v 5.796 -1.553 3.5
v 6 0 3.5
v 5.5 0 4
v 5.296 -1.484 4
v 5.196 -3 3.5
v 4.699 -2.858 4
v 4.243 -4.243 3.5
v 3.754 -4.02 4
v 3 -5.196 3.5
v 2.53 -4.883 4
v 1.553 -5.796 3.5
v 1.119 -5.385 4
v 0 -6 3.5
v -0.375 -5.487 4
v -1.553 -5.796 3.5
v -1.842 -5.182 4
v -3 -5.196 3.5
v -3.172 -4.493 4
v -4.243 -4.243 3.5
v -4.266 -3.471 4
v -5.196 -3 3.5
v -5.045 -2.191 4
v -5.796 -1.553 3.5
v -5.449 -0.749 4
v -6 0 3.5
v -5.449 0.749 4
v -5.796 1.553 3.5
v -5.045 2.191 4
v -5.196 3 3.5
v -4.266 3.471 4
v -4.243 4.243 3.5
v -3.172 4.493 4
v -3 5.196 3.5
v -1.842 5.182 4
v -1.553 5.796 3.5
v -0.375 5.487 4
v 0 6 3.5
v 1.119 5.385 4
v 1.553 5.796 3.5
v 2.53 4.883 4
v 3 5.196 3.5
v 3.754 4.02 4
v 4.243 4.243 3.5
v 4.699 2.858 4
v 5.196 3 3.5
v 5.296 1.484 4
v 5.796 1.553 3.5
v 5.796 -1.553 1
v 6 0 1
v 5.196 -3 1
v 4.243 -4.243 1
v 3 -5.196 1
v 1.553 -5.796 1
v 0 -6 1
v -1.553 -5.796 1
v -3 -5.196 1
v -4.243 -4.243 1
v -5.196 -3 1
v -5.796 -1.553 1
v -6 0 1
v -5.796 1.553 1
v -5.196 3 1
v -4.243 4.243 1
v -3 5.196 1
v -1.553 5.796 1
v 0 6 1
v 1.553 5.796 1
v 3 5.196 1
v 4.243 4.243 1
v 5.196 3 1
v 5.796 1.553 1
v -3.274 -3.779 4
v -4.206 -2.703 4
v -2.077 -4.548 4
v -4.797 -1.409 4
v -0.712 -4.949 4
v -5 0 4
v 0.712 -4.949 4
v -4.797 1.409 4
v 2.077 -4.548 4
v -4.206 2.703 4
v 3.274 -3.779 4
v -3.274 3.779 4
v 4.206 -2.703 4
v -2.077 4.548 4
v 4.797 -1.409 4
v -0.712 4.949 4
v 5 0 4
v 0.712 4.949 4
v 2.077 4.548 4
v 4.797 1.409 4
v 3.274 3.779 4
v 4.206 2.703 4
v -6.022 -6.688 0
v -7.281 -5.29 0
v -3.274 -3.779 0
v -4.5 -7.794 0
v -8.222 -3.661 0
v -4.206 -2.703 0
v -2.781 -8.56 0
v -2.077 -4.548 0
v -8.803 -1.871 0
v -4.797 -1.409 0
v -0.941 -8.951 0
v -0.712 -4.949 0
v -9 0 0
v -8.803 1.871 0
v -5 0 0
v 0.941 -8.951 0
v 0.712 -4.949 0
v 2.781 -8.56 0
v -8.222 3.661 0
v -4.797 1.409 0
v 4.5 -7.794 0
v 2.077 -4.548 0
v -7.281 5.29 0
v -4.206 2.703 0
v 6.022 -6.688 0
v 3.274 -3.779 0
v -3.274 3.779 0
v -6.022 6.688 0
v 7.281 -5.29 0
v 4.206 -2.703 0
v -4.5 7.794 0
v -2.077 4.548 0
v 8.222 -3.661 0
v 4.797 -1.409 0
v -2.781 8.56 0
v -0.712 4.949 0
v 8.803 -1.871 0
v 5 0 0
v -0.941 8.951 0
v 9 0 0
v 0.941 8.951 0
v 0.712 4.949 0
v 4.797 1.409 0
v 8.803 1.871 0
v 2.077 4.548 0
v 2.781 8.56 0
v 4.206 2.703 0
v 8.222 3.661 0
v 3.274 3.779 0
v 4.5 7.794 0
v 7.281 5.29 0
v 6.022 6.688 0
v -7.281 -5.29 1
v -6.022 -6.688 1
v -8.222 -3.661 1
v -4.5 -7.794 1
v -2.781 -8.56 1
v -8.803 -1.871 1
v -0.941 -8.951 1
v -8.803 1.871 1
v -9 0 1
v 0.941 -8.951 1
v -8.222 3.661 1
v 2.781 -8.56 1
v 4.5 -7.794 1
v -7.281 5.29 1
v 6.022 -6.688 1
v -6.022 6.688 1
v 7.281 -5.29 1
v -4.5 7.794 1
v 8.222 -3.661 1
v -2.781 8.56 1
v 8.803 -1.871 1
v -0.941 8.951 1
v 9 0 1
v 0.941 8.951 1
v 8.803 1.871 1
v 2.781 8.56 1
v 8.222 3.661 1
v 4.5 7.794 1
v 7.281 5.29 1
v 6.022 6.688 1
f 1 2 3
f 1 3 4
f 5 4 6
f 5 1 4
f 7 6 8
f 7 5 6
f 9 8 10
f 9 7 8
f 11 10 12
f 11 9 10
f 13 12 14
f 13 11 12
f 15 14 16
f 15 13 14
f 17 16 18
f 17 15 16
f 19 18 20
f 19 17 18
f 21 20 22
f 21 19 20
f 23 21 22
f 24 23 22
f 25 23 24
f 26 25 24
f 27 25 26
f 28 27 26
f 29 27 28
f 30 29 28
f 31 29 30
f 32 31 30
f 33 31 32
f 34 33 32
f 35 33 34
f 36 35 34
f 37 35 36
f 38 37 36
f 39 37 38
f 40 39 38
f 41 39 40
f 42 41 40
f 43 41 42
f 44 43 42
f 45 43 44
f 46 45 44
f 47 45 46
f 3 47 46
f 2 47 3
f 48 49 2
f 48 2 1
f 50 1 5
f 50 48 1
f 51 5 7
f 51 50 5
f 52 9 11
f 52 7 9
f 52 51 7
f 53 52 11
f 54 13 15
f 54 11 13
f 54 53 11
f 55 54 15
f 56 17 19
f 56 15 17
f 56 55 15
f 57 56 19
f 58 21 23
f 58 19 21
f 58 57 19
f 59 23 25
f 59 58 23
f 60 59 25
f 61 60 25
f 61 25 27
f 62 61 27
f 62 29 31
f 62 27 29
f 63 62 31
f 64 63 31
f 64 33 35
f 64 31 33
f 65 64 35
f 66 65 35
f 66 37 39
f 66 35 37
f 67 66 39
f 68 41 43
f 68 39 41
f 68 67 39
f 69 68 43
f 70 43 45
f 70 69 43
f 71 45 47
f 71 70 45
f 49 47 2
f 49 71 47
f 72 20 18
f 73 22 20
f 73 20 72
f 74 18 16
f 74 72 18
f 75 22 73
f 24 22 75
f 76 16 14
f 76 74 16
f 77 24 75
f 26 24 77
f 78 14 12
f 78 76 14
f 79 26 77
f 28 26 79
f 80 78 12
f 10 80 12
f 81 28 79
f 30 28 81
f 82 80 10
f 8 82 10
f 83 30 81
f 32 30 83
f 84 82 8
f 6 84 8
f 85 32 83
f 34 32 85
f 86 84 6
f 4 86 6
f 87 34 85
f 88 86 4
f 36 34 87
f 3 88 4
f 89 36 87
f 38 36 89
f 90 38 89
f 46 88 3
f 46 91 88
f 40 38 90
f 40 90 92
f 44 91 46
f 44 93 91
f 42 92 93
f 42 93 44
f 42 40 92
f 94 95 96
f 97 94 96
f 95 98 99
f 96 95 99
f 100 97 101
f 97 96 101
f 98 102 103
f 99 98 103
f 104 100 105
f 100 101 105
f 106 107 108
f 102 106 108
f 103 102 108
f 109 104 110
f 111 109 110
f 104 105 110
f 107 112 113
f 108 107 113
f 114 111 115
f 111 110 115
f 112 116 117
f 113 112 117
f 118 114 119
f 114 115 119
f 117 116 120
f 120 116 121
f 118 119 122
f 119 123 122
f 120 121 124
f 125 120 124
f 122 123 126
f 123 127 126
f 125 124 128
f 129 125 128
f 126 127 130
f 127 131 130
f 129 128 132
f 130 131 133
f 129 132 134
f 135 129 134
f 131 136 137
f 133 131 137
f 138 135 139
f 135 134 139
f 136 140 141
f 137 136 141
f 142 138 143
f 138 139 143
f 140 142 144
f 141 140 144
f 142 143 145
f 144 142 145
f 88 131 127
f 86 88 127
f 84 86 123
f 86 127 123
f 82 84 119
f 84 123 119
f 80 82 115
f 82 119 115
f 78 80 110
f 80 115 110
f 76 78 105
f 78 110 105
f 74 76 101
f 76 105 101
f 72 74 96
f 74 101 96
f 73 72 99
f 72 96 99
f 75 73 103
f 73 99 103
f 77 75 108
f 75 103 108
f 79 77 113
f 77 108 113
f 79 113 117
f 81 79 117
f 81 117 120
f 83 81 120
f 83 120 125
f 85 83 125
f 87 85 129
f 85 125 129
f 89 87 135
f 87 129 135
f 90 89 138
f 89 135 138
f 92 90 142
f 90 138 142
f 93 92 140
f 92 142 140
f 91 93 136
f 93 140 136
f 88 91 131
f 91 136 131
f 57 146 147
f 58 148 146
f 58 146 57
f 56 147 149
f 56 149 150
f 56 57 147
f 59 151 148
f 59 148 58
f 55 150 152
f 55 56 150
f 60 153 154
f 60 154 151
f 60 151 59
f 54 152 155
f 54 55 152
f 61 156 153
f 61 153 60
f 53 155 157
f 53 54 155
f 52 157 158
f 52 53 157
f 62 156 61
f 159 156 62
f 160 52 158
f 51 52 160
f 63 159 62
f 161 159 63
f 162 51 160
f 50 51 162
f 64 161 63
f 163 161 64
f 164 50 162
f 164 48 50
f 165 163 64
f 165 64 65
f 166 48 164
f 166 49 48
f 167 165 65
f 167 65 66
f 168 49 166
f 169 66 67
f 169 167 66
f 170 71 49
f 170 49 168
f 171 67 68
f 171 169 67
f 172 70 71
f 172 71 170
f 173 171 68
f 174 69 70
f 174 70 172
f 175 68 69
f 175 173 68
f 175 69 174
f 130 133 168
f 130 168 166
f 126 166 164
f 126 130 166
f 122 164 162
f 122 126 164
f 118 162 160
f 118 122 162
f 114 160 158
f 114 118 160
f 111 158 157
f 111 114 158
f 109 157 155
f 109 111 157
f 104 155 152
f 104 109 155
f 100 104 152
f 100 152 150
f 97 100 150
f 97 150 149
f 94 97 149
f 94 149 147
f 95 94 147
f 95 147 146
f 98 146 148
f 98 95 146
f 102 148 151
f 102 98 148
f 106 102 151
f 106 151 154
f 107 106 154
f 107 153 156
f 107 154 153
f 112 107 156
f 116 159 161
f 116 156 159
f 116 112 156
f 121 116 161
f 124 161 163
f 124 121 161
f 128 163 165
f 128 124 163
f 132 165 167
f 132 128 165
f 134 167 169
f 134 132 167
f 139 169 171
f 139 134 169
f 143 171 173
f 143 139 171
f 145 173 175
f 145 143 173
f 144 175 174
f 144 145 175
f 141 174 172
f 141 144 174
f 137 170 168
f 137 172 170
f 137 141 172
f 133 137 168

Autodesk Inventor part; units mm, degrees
ref_plane "YZ Plane" through (0, 0, 0) normal (1, 0, 0) x (0, 1, 0)
ref_plane "XZ Plane" through (0, 0, 0) normal (0, 1, 0) x (-1, 0, 0)
ref_plane "XY Plane" through (0, 0, 0) normal (0, 0, 1) x (1, 0, 0)
sketch "スケッチ1" plane through (0, 0, 0) normal (0, 0, 1) x (1, 0, 0)
  circle A0 centre (0, 0) radius 5
  circle A1 centre (0, 0) radius 9
  dimension "d0" = 10
  dimension "d1" = 18
extrude "押し出し1" add sketch "スケッチ1" along normal blind 1
sketch "スケッチ2" plane through (0, 0, 1) normal (0, 0, 1) x (1, 0, 0)
  circle A0 centre (0, 0) radius 6
  circle A1 centre (0, 0) radius 9 projected
  circle A2 centre (0, 0) radius 5 projected
  dimension "d4" = 12
extrude "押し出し2" add sketch "スケッチ2" along normal blind 3 contours A0
chamfer "面取り1" distance 0.5 angle 45 1 edges at (-6, 0, 4)
properties part number "オイレスw5f10-12a" material "アセタール樹脂、黒"
